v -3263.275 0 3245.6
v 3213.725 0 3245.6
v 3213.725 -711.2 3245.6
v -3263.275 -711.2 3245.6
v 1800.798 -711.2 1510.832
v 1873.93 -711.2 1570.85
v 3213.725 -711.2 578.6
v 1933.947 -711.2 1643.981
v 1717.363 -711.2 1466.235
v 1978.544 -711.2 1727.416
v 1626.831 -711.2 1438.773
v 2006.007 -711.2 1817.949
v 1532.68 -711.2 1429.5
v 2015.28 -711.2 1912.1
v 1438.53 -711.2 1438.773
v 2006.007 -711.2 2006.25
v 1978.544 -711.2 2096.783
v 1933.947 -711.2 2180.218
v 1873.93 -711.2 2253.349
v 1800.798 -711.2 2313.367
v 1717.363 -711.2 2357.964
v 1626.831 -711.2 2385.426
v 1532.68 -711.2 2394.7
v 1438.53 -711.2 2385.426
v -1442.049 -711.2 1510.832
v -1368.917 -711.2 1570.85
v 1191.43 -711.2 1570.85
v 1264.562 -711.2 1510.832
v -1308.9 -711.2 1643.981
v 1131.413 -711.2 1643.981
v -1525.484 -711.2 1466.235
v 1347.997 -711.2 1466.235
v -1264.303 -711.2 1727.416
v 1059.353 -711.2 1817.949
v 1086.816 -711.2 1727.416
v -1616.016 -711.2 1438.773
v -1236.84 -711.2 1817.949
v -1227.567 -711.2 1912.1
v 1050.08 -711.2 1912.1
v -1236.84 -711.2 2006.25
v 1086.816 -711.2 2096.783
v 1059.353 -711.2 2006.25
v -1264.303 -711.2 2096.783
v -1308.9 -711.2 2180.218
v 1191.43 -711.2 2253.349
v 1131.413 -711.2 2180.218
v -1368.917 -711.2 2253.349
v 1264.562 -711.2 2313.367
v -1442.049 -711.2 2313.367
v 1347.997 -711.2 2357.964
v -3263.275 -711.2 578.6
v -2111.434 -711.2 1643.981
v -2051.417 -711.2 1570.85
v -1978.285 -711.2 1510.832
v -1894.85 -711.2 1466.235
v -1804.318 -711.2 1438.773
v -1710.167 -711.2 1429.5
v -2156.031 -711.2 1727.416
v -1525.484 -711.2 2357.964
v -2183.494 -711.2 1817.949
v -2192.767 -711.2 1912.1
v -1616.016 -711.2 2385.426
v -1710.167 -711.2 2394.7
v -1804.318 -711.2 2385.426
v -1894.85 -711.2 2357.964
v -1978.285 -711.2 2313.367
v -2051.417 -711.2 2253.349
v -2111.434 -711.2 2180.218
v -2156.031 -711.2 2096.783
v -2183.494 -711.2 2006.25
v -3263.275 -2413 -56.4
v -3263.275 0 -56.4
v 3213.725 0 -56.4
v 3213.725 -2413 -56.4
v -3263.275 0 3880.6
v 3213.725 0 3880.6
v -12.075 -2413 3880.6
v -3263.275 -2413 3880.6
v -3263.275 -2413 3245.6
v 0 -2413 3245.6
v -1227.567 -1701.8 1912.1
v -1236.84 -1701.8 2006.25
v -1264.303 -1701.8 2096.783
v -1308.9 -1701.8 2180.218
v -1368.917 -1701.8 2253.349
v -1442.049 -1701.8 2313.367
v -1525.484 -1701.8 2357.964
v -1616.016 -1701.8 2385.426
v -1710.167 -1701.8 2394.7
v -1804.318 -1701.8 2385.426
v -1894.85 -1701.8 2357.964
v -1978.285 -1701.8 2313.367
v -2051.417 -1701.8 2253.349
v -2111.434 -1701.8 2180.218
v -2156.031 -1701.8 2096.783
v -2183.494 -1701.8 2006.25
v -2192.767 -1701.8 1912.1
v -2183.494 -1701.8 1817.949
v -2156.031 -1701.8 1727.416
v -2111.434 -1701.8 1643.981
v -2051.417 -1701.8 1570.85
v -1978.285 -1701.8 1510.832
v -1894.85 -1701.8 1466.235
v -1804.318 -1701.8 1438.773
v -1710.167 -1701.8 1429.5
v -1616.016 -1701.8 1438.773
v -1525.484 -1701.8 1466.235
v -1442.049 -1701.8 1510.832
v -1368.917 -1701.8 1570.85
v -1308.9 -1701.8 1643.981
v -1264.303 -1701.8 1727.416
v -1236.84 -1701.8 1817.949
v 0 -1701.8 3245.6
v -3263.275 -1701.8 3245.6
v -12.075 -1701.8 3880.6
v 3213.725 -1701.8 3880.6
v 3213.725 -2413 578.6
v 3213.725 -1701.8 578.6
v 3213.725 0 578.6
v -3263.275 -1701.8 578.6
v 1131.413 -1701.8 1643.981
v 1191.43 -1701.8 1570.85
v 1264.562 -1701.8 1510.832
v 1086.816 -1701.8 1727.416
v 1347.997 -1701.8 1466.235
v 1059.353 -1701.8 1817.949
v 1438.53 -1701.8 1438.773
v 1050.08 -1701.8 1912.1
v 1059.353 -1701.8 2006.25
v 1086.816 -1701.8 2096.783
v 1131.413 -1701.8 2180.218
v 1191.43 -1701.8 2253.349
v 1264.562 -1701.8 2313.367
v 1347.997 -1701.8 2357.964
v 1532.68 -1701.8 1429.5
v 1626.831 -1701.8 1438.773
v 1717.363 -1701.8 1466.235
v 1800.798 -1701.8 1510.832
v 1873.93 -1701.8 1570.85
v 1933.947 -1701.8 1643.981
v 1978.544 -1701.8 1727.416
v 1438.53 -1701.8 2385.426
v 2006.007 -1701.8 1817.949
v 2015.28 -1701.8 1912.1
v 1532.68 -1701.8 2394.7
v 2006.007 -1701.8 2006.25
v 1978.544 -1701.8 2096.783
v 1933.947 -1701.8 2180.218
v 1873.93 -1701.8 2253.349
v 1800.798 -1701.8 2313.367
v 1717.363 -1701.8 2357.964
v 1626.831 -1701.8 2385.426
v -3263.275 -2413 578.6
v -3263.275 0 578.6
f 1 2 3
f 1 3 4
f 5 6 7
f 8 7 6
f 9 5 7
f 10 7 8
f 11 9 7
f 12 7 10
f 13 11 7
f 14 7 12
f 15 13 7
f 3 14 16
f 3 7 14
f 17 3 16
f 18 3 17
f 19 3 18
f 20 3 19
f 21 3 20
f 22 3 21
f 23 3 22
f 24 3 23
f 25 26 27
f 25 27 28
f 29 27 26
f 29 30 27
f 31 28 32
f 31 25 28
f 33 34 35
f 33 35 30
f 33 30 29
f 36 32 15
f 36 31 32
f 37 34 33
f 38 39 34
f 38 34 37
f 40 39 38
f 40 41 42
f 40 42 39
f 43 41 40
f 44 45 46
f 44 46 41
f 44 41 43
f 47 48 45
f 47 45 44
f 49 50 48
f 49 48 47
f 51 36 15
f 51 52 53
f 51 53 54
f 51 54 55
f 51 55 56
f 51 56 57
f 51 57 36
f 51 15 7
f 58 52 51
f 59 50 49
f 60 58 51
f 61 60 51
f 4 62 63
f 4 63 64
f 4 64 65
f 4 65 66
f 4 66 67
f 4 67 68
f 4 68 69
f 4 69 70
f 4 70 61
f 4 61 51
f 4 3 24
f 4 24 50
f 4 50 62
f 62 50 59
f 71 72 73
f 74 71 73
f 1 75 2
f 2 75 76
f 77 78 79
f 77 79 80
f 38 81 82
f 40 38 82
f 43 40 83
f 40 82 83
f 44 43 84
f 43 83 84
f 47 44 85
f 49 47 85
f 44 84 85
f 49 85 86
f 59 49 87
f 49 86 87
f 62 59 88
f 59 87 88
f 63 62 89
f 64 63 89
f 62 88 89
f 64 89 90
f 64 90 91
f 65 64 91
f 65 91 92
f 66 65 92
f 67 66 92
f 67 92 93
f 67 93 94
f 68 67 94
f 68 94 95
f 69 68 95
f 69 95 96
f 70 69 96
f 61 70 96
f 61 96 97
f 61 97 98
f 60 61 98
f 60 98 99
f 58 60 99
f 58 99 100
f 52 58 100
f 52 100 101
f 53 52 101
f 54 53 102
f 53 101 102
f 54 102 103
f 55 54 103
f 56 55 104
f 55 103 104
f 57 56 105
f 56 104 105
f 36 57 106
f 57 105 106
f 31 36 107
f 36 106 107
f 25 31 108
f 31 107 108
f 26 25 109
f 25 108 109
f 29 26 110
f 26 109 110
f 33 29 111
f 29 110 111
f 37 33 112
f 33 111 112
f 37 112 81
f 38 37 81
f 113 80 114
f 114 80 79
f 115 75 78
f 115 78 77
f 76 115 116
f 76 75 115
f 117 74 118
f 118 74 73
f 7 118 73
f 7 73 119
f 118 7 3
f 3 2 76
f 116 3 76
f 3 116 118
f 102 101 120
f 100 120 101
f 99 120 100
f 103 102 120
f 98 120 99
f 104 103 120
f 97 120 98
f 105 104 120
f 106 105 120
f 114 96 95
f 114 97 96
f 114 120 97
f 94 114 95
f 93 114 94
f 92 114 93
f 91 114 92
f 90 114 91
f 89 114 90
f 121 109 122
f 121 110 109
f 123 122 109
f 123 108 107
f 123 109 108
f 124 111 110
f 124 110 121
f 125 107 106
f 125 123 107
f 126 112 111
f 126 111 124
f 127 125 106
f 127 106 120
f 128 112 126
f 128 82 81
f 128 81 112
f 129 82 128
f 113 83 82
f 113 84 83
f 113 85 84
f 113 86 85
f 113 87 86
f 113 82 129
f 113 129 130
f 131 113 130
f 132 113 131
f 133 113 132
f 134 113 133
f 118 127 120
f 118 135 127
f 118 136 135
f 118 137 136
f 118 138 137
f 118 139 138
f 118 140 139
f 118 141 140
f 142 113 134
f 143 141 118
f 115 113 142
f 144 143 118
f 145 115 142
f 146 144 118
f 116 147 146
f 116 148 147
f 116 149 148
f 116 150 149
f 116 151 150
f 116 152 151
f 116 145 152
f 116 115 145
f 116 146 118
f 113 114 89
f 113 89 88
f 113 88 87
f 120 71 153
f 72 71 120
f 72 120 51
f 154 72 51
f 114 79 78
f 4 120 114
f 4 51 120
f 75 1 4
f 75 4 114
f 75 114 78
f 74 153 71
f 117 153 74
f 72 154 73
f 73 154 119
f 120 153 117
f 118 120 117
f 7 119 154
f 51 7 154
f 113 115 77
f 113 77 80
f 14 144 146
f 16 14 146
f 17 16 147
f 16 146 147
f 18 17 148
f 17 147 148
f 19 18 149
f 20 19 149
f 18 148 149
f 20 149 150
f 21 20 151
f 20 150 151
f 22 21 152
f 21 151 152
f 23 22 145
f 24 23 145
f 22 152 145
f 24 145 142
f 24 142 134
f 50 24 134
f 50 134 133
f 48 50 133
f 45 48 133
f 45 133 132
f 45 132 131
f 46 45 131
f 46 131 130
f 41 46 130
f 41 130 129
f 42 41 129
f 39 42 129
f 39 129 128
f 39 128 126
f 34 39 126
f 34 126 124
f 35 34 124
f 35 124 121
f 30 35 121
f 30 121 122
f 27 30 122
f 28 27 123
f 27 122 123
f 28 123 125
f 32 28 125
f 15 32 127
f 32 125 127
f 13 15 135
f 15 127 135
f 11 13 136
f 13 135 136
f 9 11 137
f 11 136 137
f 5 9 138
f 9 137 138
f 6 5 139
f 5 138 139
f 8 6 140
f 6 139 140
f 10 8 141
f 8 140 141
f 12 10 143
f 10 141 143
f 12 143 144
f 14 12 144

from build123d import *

# Parameters (mm, degrees)
F0_W     = 6477
F0_H     = 3937
F1_DEPTH = 2413
F2_R     = 482.6
F3_DEPTH = 711.2
F4_DEPTH = 1701.8
F5_W     = 6477
F5_H     = 2667
F6_DEPTH = 711.2


with BuildPart() as f1:
    # F0 (on Front) → F1 (new body)
    with BuildSketch(Plane.XZ):
        with Locations((-24.775410071, 1912.0995072126)):
            Rectangle(F0_W, F0_H)
    extrude(amount=F1_DEPTH)

    # F2 (on face) → F3 (cut)
    with BuildSketch(Plane.XZ.offset(2413)):
        Polygon((3213.724589929, 578.5995072126), (3213.724589929, 3880.5995072126), (-12.075410071, 3880.5995072126), (0, 3245.5995072126), (-3263.275410071, 3245.5995072126), (-3263.275410071, 578.5995072126), align=None)
        with Locations((-1710.1669311523, 1912.0995072126)):
            Circle(F2_R, mode=Mode.SUBTRACT)
        with Locations((1532.6801538467, 1912.0995072126)):
            Circle(F2_R, mode=Mode.SUBTRACT)
    extrude(amount=-F3_DEPTH, mode=Mode.SUBTRACT)

    # F4 (cut): faces of the model
    f4_faces = [f1.faces().sort_by_distance(p)[0] for p in [
        (-1710.1669311523, -2413, 1912.0995072126),
        (1532.6801538467, -2413, 1912.0995072126),
    ]]
    extrude(f4_faces, amount=-F4_DEPTH, mode=Mode.SUBTRACT)

    # F5 (on face) → F6 (cut)
    with BuildSketch(Plane(origin=(0, 0, 0), x_dir=(-1, 0, 0), z_dir=(0, 1, 0))):
        with Locations((24.775410071, 1912.0995072126)):
            Rectangle(F5_W, F5_H)
    extrude(amount=-F6_DEPTH, mode=Mode.SUBTRACT)


solid = f1.part
